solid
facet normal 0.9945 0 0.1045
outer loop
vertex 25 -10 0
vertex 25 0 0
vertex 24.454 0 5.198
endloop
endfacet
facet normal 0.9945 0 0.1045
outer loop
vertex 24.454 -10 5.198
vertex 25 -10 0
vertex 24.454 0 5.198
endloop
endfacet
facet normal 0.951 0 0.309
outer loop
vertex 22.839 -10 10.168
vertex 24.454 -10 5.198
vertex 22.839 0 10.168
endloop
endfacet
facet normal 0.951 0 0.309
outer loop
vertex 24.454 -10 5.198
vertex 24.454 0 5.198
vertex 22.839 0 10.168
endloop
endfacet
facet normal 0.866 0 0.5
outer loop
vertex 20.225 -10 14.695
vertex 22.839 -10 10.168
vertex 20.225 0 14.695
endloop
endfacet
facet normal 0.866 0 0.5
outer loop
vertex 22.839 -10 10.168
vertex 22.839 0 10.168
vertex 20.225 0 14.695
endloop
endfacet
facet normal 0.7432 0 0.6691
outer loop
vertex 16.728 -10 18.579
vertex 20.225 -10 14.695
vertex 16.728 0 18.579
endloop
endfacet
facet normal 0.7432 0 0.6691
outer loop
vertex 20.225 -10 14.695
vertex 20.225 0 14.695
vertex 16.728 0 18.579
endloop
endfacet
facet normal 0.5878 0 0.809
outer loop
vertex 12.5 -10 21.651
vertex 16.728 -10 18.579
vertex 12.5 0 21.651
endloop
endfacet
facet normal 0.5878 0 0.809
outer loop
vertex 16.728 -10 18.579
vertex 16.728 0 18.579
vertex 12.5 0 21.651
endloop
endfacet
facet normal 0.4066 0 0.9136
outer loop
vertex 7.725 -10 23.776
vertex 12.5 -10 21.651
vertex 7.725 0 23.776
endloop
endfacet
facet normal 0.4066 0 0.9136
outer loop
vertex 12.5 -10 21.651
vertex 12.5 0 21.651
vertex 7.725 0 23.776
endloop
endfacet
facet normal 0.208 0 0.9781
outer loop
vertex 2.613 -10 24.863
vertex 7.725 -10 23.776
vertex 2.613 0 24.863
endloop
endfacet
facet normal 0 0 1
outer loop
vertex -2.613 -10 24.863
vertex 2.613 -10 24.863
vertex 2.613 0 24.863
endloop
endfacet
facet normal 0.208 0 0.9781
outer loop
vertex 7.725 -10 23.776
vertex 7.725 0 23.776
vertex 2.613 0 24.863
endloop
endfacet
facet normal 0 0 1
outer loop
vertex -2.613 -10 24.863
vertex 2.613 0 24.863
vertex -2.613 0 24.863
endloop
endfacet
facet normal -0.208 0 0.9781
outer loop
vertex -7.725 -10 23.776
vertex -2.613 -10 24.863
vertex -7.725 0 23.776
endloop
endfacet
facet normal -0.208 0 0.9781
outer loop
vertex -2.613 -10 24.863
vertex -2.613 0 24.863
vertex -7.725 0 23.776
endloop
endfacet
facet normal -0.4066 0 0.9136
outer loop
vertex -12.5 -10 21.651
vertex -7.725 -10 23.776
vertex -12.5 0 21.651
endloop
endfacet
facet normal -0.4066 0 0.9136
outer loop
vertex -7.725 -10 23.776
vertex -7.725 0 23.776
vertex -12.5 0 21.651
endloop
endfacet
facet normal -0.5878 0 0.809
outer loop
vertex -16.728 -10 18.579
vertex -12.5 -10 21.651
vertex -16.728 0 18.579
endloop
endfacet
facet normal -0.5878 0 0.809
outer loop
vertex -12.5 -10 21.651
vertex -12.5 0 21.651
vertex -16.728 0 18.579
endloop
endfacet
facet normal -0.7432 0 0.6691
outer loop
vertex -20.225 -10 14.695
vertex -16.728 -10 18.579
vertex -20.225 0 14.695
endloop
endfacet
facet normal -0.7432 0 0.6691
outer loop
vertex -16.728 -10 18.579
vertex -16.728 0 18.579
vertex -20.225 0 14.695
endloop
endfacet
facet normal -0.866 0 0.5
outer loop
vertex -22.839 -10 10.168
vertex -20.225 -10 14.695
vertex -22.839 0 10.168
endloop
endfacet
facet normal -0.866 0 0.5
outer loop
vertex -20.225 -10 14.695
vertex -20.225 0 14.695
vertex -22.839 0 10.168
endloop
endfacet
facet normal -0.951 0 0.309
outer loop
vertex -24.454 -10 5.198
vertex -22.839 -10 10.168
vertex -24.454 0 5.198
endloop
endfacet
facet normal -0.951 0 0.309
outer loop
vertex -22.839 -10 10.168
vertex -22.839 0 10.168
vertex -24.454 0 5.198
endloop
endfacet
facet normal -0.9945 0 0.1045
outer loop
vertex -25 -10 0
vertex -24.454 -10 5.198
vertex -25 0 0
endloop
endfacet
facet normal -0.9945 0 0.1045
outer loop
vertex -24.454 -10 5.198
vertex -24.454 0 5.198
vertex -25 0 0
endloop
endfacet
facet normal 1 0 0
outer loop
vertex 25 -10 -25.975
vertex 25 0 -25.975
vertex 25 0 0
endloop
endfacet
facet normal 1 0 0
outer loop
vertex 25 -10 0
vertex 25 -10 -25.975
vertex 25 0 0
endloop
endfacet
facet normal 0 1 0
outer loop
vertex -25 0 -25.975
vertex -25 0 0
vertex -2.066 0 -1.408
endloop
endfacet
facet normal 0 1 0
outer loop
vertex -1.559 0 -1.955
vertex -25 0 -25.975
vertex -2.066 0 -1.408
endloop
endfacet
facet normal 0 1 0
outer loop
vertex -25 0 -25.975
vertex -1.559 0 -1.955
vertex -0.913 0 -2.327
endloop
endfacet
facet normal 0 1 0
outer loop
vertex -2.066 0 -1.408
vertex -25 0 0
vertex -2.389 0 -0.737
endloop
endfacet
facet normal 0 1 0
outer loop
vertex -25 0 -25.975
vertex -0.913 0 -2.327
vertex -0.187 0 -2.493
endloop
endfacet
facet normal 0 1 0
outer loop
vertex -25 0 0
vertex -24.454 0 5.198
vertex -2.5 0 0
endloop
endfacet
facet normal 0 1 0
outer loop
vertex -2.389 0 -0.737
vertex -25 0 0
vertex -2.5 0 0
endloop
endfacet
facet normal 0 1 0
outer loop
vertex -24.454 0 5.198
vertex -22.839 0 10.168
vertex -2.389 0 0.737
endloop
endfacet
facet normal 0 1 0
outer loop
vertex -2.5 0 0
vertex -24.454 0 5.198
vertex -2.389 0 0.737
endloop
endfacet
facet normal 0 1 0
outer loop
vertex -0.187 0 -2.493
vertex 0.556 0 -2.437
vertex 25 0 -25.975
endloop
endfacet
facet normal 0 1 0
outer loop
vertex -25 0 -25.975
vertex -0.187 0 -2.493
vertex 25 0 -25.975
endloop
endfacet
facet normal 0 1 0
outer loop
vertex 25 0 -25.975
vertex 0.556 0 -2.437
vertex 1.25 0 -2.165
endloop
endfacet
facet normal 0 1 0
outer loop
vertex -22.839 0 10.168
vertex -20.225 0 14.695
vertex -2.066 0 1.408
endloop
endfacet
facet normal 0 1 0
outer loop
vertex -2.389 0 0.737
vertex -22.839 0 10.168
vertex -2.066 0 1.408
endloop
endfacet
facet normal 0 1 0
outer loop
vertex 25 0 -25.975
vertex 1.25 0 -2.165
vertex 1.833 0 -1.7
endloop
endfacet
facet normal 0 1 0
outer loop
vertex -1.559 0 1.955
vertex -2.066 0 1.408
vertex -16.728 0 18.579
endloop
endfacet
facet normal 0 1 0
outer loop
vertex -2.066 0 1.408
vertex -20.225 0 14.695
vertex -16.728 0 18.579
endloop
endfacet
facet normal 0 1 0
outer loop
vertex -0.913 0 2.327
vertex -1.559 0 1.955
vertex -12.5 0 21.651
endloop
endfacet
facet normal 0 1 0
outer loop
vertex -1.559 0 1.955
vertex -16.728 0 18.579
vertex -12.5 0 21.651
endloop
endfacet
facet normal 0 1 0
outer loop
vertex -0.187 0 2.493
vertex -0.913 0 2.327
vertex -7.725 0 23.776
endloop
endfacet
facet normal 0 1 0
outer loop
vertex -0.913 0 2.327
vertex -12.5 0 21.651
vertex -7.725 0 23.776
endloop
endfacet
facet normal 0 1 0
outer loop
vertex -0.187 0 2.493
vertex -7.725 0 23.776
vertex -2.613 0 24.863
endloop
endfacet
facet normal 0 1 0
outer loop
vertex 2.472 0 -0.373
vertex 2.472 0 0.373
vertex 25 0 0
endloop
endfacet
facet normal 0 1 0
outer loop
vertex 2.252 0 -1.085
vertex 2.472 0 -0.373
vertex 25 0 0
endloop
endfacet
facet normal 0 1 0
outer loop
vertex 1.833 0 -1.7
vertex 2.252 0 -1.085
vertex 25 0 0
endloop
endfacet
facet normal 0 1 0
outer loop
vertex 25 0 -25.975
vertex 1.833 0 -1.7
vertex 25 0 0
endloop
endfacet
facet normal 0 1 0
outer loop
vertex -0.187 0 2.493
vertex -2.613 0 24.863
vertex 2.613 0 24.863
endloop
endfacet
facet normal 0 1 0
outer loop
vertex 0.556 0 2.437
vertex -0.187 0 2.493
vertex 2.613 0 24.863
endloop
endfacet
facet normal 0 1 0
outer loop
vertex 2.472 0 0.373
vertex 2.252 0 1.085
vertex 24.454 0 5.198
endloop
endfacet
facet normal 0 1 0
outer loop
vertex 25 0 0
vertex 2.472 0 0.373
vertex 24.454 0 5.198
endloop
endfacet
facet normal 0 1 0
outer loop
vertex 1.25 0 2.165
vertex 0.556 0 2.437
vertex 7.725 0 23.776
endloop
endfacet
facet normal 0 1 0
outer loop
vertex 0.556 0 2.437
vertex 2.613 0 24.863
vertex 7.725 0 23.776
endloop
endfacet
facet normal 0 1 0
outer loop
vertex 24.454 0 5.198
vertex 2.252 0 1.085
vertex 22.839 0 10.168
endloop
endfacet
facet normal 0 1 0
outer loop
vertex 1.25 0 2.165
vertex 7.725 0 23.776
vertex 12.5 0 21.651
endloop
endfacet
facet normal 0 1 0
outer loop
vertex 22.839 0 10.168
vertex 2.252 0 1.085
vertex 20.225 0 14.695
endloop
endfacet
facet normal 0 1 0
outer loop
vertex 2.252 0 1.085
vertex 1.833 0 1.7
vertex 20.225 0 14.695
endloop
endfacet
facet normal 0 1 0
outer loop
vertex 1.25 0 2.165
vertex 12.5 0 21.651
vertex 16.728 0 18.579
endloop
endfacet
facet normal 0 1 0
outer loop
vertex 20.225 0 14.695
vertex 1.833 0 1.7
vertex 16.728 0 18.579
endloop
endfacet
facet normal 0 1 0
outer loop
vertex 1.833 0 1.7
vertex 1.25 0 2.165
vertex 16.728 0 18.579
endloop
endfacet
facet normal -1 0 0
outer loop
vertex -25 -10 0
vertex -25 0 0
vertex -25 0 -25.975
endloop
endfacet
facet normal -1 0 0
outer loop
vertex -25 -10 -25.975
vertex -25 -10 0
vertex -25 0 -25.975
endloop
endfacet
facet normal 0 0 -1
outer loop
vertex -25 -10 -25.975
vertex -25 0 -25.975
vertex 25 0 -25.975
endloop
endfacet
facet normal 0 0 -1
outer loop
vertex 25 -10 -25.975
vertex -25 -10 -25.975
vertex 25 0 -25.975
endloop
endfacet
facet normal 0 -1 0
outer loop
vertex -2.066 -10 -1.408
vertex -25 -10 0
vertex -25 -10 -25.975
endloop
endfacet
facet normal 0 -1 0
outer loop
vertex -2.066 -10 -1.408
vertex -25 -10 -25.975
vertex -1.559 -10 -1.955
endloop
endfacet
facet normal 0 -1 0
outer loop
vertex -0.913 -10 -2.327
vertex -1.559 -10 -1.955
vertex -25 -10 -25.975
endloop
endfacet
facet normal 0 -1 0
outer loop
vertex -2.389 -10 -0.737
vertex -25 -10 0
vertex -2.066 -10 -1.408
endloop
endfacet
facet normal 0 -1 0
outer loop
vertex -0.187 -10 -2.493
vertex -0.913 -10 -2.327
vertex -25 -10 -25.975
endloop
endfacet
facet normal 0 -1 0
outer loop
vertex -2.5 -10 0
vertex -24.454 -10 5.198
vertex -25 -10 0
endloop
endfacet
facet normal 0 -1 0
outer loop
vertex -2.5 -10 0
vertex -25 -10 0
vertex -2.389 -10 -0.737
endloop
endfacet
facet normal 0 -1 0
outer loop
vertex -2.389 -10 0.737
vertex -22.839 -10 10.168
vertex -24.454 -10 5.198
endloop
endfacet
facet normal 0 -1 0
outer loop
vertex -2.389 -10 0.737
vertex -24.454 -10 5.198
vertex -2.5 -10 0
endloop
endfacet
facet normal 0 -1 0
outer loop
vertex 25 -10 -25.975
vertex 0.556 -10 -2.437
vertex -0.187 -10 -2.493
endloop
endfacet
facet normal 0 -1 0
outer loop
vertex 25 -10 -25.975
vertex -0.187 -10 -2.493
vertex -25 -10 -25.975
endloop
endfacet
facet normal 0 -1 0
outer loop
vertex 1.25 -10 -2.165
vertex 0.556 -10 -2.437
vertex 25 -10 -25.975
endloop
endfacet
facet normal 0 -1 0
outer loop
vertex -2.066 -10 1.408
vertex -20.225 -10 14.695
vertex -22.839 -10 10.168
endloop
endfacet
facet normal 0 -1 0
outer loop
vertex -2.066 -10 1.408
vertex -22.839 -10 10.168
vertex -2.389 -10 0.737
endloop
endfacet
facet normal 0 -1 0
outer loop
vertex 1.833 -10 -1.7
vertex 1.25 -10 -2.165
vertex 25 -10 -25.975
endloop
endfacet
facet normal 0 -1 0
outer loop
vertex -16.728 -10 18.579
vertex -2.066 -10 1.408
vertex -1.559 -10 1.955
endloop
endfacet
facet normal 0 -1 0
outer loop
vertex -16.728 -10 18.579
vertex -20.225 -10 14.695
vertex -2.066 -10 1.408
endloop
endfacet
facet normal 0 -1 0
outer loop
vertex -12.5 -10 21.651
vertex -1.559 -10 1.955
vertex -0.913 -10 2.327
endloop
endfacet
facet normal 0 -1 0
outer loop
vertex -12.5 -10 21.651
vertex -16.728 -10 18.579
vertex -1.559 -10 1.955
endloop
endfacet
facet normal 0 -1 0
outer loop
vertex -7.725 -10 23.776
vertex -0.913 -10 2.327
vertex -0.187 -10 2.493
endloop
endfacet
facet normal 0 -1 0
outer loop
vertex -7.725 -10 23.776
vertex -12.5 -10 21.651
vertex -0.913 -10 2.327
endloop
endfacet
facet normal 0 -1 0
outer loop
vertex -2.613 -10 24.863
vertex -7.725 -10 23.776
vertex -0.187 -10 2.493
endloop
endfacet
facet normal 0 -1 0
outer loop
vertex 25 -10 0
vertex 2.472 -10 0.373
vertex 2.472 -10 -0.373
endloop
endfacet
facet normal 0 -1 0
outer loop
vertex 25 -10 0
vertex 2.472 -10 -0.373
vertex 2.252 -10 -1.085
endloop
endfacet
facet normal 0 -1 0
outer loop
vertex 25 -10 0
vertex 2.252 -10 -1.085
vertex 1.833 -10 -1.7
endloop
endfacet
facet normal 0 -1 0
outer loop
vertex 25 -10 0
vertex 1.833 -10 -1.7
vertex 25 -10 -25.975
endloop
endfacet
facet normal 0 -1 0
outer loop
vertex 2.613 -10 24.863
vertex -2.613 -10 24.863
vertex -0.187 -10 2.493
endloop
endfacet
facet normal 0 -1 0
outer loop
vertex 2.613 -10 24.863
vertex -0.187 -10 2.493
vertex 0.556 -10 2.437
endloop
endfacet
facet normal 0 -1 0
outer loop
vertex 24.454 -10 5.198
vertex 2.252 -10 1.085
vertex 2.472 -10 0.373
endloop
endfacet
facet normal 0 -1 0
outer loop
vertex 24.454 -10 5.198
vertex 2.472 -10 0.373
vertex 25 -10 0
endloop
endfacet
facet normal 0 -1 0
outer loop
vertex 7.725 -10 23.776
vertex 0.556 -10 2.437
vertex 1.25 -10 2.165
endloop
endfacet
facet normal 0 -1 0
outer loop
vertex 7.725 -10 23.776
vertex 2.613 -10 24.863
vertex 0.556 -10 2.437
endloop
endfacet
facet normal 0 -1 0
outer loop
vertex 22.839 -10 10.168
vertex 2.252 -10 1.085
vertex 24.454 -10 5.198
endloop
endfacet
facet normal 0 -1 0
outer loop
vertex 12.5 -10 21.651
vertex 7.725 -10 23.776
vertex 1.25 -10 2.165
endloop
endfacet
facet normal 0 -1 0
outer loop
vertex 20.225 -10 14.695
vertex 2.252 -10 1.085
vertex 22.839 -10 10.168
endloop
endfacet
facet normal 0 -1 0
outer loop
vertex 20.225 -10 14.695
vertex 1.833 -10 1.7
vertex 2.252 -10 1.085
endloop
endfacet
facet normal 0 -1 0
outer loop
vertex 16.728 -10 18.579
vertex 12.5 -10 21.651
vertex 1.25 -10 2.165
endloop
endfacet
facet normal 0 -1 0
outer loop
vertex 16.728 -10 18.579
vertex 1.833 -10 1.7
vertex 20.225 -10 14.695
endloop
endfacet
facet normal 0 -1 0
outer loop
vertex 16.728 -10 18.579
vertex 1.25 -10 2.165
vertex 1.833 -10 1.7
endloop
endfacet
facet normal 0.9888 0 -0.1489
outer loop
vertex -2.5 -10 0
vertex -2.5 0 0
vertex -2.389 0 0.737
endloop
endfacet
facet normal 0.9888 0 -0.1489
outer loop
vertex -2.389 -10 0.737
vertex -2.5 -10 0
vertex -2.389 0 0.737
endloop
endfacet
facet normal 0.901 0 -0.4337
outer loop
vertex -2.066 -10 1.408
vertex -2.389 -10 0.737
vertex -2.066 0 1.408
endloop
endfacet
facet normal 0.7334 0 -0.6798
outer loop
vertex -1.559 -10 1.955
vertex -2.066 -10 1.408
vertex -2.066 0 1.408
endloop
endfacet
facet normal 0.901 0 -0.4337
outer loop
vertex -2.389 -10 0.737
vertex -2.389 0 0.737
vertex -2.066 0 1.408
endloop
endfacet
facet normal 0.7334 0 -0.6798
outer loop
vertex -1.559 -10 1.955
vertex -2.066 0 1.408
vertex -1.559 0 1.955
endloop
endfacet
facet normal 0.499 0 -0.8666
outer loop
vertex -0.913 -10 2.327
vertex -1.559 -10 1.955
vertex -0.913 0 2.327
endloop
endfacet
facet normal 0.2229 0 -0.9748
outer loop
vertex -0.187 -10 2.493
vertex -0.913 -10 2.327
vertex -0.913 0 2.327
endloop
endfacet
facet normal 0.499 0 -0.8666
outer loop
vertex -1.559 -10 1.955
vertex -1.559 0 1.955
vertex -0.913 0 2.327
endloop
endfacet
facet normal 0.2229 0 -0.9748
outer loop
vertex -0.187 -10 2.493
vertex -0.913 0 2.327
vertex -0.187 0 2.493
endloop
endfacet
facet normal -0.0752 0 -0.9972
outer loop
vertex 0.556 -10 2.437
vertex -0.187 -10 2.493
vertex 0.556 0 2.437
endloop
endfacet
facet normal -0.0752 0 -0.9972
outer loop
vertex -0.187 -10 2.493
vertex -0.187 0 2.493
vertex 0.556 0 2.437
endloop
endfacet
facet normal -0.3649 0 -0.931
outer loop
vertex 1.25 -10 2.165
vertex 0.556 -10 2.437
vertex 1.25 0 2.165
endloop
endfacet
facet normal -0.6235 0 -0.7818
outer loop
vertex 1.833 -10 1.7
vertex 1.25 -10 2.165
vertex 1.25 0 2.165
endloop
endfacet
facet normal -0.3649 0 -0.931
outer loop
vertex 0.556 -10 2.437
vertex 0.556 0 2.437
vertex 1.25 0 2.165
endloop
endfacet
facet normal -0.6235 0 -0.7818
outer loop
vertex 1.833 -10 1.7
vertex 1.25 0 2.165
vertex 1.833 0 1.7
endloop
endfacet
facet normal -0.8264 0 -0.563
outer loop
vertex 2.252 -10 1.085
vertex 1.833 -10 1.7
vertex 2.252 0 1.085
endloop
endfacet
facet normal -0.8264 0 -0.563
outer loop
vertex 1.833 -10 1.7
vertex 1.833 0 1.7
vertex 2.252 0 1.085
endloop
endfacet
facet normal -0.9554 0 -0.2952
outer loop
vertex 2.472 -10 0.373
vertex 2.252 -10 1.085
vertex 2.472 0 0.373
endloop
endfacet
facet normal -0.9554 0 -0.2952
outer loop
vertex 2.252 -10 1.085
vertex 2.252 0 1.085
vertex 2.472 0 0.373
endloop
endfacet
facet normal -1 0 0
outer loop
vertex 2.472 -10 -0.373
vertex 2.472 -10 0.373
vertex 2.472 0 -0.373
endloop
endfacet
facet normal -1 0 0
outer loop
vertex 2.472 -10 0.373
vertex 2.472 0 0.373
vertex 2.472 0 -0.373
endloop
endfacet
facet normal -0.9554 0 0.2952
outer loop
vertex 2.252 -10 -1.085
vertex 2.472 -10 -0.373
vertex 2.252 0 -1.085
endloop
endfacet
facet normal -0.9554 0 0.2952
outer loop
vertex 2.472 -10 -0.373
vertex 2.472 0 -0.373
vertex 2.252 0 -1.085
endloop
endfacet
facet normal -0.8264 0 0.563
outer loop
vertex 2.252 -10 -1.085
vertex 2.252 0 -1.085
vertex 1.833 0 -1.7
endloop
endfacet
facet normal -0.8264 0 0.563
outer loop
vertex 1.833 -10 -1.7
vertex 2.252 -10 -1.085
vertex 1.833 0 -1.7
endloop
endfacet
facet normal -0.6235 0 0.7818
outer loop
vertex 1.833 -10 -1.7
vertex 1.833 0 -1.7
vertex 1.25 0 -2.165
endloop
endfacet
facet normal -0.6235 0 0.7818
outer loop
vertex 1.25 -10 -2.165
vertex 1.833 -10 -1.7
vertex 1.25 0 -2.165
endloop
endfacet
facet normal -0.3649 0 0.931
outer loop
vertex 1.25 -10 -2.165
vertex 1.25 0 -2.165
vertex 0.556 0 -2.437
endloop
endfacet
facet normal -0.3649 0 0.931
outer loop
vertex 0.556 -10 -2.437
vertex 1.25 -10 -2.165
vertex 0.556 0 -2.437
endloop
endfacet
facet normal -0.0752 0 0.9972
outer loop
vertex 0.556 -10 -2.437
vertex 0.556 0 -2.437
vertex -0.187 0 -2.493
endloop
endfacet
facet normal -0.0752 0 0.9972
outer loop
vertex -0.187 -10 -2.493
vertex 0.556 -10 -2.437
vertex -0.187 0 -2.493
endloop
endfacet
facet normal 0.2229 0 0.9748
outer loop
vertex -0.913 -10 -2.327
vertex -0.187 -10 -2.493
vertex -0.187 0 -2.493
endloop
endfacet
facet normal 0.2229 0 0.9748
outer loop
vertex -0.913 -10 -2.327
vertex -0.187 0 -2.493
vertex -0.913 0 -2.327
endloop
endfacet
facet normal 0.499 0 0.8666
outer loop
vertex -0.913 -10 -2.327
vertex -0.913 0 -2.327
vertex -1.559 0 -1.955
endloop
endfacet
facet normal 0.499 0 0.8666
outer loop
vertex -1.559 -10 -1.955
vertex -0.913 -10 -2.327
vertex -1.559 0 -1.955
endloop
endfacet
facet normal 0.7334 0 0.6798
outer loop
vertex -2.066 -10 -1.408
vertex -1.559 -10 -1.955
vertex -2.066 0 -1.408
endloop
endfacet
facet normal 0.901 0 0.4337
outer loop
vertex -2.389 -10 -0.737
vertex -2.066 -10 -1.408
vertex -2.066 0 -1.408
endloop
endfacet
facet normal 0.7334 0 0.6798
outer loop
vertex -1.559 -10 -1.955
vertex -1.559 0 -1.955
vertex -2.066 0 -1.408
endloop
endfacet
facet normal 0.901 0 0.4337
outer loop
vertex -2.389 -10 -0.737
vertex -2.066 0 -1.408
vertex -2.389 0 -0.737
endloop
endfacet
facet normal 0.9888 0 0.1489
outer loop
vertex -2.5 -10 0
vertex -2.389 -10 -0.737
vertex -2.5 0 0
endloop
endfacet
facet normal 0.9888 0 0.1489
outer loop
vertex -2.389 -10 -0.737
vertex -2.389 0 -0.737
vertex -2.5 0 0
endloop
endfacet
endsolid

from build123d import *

# Parameters (mm, degrees)
F1_DEPTH = 10


with BuildPart() as f1:
    # F0 (on Front) → F1 (new body)
    with BuildSketch(Plane.XZ):
        with BuildLine():
            Line((25, -25.975256), (25, 0))
            ThreePointArc((25, 0), (0, -25), (-25, 0))
            Line((-25, 0), (-25, -25.975256))
            Line((-25, -25.975256), (25, -25.975256))
        make_face()
        with BuildLine():
            Line((2.5, 0), (25, 0))
            ThreePointArc((25, 0), (0, 25), (-25, 0))
            Line((-25, 0), (-2.5, 0))
            ThreePointArc((-2.5, 0), (0, 2.5), (2.5, 0))
        make_face()
        with BuildLine():
            ThreePointArc((-25, 0), (0, -25), (25, 0))
            Line((25, 0), (2.5, 0))
            ThreePointArc((2.5, 0), (0, -2.5), (-2.5, 0))
            Line((-2.5, 0), (-25, 0))
        make_face()
    extrude(amount=F1_DEPTH)


solid = f1.part
